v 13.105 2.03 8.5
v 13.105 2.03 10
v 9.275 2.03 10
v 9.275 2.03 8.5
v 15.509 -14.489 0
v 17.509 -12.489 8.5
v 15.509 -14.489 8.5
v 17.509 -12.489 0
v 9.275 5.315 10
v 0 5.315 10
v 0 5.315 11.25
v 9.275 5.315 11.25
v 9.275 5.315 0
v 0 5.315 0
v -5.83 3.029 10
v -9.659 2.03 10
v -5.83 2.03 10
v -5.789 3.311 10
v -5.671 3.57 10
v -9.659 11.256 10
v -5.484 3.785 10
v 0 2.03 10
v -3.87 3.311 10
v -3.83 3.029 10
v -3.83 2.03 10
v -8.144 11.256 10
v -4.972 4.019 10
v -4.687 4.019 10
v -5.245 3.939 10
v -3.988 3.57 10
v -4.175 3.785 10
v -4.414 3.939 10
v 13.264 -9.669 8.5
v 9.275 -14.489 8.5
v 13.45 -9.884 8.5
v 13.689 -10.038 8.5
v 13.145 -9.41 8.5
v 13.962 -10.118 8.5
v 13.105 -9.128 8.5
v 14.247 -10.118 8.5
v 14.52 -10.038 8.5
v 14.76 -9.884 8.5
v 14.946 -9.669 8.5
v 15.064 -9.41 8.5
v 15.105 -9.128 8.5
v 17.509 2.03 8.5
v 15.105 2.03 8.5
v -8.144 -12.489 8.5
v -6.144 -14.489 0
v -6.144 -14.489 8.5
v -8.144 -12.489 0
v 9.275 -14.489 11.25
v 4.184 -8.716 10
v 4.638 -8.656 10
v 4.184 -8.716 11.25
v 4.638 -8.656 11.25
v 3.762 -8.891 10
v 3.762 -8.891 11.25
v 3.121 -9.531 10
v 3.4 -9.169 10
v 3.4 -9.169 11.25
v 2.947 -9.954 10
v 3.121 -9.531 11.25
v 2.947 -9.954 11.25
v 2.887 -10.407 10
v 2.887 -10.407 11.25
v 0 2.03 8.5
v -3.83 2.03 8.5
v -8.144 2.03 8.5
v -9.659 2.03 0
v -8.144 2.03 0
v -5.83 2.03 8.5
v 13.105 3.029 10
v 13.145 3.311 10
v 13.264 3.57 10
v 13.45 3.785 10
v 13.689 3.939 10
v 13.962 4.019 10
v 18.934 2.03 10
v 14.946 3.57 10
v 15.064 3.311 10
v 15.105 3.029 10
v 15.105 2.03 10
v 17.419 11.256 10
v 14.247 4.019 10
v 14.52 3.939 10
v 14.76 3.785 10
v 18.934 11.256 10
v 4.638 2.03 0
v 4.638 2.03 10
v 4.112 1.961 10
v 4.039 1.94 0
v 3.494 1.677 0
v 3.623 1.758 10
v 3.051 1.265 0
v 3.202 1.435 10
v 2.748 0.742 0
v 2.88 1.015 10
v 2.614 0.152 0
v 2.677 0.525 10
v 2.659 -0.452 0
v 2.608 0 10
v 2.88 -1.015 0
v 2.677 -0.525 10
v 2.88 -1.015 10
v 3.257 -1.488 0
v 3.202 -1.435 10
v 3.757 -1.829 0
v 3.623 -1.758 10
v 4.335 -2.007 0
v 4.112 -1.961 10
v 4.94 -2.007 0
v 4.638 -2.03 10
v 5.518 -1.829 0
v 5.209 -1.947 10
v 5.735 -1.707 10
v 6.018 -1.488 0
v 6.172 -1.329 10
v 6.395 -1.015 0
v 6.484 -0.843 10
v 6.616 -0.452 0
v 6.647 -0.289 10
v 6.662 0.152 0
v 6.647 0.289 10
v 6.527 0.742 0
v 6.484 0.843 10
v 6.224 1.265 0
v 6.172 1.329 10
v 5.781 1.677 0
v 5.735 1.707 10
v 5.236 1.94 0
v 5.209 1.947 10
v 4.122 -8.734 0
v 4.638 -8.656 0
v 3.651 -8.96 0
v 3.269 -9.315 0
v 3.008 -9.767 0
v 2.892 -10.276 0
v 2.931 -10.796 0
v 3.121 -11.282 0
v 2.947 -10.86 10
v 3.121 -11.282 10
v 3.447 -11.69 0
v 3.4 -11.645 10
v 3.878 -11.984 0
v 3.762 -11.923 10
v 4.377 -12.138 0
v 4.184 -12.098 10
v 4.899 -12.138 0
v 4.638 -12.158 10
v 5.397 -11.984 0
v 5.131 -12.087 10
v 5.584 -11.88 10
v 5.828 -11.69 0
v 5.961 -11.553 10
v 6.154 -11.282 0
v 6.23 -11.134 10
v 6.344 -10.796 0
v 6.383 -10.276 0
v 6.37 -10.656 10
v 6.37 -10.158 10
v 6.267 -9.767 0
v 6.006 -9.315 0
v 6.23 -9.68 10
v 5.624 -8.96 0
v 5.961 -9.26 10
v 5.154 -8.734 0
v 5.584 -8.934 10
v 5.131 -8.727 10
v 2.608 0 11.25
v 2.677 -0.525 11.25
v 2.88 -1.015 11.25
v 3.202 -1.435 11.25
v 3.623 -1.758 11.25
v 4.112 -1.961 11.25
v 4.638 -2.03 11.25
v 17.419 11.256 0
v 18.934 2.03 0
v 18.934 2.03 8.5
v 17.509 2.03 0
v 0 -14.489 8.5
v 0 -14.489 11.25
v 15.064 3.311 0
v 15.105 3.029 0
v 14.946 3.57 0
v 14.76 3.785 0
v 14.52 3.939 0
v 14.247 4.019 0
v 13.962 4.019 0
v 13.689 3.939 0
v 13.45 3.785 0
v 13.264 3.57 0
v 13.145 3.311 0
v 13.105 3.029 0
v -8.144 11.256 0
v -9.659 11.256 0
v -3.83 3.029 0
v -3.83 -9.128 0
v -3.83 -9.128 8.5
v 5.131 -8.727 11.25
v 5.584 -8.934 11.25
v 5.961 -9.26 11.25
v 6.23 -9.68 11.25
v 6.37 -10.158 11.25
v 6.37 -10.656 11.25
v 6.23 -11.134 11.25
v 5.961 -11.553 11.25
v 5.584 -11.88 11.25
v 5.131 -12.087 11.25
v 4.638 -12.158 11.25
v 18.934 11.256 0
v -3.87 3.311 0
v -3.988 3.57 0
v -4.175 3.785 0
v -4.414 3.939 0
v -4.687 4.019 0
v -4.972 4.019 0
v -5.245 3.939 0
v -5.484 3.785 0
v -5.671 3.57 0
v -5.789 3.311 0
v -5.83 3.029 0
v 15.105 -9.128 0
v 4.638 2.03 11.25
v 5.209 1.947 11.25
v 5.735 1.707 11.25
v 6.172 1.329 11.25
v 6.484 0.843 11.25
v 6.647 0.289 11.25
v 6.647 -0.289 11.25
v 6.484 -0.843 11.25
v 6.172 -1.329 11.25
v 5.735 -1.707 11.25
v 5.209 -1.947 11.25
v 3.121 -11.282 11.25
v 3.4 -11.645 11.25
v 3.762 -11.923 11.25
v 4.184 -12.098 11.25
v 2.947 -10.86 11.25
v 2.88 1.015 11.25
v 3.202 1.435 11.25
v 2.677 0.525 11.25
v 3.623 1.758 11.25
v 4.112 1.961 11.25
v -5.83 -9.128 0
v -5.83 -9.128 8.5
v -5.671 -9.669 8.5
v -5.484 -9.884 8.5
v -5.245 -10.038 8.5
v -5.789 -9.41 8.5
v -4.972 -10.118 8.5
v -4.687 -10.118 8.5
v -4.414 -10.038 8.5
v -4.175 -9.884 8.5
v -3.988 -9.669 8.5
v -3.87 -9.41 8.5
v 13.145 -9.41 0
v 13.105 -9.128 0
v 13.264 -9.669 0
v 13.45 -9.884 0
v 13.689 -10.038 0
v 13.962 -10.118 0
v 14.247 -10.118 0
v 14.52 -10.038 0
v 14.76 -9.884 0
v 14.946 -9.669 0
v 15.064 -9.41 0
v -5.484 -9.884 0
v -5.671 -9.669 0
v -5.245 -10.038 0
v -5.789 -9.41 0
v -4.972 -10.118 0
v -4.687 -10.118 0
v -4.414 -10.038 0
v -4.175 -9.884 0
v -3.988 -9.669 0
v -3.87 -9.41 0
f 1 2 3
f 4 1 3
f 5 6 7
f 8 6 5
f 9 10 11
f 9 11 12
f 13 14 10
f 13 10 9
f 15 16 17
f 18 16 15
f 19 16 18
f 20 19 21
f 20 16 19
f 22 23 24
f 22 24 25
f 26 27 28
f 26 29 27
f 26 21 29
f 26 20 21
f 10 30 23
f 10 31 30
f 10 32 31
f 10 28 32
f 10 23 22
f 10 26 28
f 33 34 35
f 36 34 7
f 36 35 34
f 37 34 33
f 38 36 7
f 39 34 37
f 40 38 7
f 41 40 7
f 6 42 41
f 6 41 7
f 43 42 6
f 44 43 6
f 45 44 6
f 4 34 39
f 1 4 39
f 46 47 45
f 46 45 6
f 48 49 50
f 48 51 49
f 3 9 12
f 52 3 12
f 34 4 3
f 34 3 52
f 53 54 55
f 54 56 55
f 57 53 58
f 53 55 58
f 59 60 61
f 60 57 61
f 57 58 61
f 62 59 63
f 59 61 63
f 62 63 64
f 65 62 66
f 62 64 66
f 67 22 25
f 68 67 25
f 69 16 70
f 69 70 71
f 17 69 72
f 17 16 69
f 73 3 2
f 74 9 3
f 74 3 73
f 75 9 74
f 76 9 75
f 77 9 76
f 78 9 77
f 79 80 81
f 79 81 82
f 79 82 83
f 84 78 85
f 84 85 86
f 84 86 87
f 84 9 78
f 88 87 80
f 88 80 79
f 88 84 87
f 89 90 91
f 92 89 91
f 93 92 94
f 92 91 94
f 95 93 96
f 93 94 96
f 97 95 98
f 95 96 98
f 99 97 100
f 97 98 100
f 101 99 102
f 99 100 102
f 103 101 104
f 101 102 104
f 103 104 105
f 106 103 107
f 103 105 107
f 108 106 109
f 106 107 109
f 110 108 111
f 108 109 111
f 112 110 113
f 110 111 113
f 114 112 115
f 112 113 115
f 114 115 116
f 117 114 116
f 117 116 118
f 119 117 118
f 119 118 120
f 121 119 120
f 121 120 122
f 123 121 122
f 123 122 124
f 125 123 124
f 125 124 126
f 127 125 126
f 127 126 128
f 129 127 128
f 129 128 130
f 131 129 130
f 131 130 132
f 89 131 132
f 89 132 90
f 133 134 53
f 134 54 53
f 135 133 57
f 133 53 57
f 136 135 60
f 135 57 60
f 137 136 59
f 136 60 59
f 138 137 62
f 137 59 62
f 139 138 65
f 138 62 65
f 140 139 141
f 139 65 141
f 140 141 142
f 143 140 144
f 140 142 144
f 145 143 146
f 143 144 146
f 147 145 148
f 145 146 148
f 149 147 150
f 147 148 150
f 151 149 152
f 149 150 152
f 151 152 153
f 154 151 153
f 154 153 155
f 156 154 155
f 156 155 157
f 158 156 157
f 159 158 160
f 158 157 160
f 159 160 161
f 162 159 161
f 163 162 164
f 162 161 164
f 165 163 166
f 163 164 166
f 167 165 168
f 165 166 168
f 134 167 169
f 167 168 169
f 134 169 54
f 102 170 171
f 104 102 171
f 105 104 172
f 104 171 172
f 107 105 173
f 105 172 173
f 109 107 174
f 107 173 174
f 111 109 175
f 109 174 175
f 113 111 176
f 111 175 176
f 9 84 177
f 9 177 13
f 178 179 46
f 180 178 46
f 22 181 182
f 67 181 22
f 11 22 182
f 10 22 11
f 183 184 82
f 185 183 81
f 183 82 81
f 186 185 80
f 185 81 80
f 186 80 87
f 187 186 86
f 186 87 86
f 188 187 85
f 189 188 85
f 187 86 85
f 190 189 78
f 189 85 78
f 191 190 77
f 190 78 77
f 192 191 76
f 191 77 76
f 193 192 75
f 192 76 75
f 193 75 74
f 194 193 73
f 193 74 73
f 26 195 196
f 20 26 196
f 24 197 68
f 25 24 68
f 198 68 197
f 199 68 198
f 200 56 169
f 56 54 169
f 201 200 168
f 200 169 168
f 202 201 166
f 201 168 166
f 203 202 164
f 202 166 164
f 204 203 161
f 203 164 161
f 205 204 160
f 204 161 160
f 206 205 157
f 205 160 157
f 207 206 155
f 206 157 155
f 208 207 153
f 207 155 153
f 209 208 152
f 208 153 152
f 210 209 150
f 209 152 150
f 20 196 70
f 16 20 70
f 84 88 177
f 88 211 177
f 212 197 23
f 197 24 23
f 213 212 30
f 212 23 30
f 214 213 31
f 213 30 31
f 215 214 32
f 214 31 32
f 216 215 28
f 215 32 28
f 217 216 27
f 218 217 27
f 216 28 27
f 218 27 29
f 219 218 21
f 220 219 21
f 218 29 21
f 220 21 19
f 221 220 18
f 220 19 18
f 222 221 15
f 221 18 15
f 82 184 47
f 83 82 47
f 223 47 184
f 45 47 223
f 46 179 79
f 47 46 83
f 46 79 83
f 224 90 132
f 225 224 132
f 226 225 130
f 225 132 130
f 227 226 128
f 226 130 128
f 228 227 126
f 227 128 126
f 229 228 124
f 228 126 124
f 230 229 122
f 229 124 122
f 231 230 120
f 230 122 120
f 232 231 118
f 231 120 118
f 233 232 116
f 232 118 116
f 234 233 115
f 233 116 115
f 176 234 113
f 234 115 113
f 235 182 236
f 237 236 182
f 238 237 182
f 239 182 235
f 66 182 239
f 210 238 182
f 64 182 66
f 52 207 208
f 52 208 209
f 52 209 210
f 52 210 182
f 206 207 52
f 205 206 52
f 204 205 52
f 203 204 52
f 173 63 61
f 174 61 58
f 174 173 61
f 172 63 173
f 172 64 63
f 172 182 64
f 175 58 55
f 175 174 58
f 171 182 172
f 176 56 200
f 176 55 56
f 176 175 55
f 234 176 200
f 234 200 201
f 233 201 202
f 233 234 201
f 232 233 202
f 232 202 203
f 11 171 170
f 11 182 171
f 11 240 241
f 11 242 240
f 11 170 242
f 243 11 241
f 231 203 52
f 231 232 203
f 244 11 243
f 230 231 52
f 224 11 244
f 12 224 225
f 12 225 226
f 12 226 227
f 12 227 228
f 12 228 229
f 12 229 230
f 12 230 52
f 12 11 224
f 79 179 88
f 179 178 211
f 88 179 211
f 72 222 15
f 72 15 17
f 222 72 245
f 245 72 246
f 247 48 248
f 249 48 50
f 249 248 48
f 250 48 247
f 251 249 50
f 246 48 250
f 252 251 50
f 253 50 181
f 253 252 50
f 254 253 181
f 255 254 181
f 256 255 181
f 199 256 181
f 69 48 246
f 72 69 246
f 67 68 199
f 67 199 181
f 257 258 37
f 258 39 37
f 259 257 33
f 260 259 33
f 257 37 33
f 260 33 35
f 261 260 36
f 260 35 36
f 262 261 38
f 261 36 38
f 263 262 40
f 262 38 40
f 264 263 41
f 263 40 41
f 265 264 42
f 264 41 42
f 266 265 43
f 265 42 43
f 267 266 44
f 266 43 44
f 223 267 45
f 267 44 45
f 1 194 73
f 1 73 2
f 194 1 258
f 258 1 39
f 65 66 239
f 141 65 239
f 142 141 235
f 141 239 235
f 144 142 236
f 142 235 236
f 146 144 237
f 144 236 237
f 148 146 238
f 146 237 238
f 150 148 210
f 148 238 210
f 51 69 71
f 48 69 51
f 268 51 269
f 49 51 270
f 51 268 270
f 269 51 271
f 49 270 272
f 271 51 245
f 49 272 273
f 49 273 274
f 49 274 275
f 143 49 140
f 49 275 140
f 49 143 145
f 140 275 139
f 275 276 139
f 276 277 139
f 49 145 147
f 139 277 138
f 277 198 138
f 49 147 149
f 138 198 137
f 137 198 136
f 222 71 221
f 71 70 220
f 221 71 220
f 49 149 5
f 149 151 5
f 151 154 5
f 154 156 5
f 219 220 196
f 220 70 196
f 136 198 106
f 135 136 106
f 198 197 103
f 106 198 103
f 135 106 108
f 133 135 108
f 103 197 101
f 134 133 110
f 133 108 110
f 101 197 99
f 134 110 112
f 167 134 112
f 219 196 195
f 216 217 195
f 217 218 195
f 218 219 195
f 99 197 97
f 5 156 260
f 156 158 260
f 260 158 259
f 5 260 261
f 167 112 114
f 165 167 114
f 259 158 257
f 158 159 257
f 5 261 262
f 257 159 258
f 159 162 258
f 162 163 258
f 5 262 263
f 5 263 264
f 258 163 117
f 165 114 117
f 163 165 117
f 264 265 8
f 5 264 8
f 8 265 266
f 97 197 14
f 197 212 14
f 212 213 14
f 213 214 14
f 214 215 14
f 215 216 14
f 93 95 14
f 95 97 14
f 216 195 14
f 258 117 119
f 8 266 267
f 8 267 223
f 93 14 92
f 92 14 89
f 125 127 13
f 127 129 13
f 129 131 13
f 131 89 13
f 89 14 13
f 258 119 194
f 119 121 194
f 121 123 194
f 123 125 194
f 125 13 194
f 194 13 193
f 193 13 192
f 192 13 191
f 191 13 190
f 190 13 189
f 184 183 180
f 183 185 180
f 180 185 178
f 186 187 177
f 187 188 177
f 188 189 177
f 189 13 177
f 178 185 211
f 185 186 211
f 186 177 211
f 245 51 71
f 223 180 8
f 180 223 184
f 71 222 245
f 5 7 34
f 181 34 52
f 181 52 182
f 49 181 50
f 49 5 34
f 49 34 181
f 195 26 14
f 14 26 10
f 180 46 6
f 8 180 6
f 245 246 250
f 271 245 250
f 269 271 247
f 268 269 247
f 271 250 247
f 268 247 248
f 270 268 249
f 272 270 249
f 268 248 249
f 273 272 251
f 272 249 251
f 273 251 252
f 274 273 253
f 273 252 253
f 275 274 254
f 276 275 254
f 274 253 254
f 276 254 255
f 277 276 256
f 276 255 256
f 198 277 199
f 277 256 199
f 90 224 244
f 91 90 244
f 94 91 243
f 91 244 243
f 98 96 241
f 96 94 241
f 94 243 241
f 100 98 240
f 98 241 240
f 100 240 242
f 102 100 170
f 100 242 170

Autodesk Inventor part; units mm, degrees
ref_plane "YZ Plane" through (0, 0, 0) normal (1, 0, 0) x (0, 1, 0)
ref_plane "XZ Plane" through (0, 0, 0) normal (0, 1, 0) x (-1, 0, 0)
ref_plane "XY Plane" through (0, 0, 0) normal (0, 0, 1) x (1, 0, 0)
sketch "스케치1" plane through (0, 0, 0) normal (0, 0, 1) x (1, 0, 0)
  line L0 (0, 11.2555) -> (-9.6591, 11.2555)
  line L1 (-9.6591, 11.2555) -> (-9.6591, -14.4887)
  line L2 (-9.6591, -14.4887) -> (0, -14.4887)
  line L3 (0, -14.4887) -> (0, 11.2555)
  point P0 (0, 0)
extrude "돌출1" add sketch "스케치1" along normal blind 10
sketch "스케치2" plane through (0, 0, 10) normal (0, 0, 1) x (1, 0, 0)
  line L0 (0, 11.2555) -> (-9.6591, 11.2555) projected
  line L1 (0, -14.4887) -> (0, 11.2555) projected
  line L2 (-8.1436, 11.2555) -> (0, 5.3146)
  line L3 (0, 5.3146) -> (9.2752, 5.3146)
  line L4 (9.2752, 5.3146) -> (9.2752, -14.4887)
  line L5 (9.2752, -14.4887) -> (0, -14.4887)
  line L6 (0, -14.4887) -> (0, 5.3146)
  circle A0 centre (4.6376, 0) radius 2.0297
  circle A1 centre (4.6376, -10.4068) radius 1.7507
  line L7 (0, 2.0297) -> (-9.6591, 2.0297)
  line L8 (-9.6591, 2.0297) -> (-9.6591, -14.4887)
  line L9 (-9.6591, -14.4887) -> (0, -14.4887)
  line L10 (0, -14.4887) -> (0, 2.0297)
  arc A2 (-3.8296, 3.0291) -> (-5.8296, 3.0291) centre (-4.8296, 3.0291) ccw
  arc A3 (-5.8296, -9.1284) -> (-3.8296, -9.1284) centre (-4.8296, -9.1284) ccw
  line L11 (-5.8296, 3.0291) -> (-5.8296, -9.1284)
  line L12 (-3.8296, 3.0291) -> (-3.8296, -9.1284)
  point P0 (0, 0)
  dimension "d2" = 2
  dimension "d3" = 2
extrude "돌출2" add sketch "스케치2" against normal blind 10 contours L3 L4 L5 L1
extrude "돌출3" add sketch "스케치2" along normal blind 1.25 contours L3 L4 L5 L1
extrude "돌출4" cut sketch "스케치2" against normal up to next contours L1 L2 L0
extrude "돌출5" cut sketch "스케치2" against normal up to next contours L12 A3 L11 L7 | L7 L11 A2 L12
extrude "돌출6" cut sketch "스케치2" against normal blind 1.5 contours L1 L9 L8 L7 L11 A3 L12 | L12 A3 L11 L7
sketch "스케치3" plane through (0, 0, 8.5) normal (0, 0, 1) x (1, 0, 0)
  line L0 (0, -14.4887) -> (-9.6591, -14.4887) projected
  line L1 (-9.6591, 2.0297) -> (-8.1436, 2.0297)
  line L2 (-8.1436, 2.0297) -> (-8.1436, -14.4887)
  line L3 (-8.1436, -14.4887) -> (-9.6591, -14.4887)
  line L4 (-9.6591, -14.4887) -> (-9.6591, 2.0297)
  point P0 (0, 0)
extrude "돌출7" cut sketch "스케치3" against normal up to next
chamfer "모따기1" distance 2 angle 45 1 edges at (-8.1436, -14.4887, 4.25)
sketch "스케치4" plane through (0, 0, 11.25) normal (0, 0, 1) x (1, 0, 0)
  line L0 (0, -14.4887) -> (9.2752, -14.4887) projected
  line L1 (9.2752, 5.3146) -> (4.6376, 5.3146)
  line L2 (4.6376, 5.3146) -> (4.6376, -14.4887)
  line L3 (4.6376, -14.4887) -> (9.2752, -14.4887)
  line L4 (9.2752, -14.4887) -> (9.2752, 5.3146)
  point P0 (0, 0)
extrude "돌출8" cut sketch "스케치4" against normal up to next
mirror "대칭1" about plane through (4.6376, -14.4887, 11.25) normal (1, 0, 0) of "돌출4", "돌출2", "돌출3", "돌출1", "돌출6", "돌출5"
sketch "스케치5" plane through (9.2752, -14.4887, 8.5) normal (0, 0, 1) x (1, 0, 0)
  line L0 (9.6591, 0) -> (0, 0) projected
  line L1 (9.6591, 16.5185) -> (8.2337, 16.5185)
  line L2 (8.2337, 16.5185) -> (8.2337, 0)
  line L3 (8.2337, 0) -> (9.6591, 0)
  line L4 (9.6591, 0) -> (9.6591, 16.5185)
  point P0 (-9.2752, 14.4887)
extrude "돌출9" cut sketch "스케치5" against normal up to next
chamfer "모따기2" distance 2 angle 45 1 edges at (17.5089, -14.4887, 4.25)
properties part number "240710_part1"
